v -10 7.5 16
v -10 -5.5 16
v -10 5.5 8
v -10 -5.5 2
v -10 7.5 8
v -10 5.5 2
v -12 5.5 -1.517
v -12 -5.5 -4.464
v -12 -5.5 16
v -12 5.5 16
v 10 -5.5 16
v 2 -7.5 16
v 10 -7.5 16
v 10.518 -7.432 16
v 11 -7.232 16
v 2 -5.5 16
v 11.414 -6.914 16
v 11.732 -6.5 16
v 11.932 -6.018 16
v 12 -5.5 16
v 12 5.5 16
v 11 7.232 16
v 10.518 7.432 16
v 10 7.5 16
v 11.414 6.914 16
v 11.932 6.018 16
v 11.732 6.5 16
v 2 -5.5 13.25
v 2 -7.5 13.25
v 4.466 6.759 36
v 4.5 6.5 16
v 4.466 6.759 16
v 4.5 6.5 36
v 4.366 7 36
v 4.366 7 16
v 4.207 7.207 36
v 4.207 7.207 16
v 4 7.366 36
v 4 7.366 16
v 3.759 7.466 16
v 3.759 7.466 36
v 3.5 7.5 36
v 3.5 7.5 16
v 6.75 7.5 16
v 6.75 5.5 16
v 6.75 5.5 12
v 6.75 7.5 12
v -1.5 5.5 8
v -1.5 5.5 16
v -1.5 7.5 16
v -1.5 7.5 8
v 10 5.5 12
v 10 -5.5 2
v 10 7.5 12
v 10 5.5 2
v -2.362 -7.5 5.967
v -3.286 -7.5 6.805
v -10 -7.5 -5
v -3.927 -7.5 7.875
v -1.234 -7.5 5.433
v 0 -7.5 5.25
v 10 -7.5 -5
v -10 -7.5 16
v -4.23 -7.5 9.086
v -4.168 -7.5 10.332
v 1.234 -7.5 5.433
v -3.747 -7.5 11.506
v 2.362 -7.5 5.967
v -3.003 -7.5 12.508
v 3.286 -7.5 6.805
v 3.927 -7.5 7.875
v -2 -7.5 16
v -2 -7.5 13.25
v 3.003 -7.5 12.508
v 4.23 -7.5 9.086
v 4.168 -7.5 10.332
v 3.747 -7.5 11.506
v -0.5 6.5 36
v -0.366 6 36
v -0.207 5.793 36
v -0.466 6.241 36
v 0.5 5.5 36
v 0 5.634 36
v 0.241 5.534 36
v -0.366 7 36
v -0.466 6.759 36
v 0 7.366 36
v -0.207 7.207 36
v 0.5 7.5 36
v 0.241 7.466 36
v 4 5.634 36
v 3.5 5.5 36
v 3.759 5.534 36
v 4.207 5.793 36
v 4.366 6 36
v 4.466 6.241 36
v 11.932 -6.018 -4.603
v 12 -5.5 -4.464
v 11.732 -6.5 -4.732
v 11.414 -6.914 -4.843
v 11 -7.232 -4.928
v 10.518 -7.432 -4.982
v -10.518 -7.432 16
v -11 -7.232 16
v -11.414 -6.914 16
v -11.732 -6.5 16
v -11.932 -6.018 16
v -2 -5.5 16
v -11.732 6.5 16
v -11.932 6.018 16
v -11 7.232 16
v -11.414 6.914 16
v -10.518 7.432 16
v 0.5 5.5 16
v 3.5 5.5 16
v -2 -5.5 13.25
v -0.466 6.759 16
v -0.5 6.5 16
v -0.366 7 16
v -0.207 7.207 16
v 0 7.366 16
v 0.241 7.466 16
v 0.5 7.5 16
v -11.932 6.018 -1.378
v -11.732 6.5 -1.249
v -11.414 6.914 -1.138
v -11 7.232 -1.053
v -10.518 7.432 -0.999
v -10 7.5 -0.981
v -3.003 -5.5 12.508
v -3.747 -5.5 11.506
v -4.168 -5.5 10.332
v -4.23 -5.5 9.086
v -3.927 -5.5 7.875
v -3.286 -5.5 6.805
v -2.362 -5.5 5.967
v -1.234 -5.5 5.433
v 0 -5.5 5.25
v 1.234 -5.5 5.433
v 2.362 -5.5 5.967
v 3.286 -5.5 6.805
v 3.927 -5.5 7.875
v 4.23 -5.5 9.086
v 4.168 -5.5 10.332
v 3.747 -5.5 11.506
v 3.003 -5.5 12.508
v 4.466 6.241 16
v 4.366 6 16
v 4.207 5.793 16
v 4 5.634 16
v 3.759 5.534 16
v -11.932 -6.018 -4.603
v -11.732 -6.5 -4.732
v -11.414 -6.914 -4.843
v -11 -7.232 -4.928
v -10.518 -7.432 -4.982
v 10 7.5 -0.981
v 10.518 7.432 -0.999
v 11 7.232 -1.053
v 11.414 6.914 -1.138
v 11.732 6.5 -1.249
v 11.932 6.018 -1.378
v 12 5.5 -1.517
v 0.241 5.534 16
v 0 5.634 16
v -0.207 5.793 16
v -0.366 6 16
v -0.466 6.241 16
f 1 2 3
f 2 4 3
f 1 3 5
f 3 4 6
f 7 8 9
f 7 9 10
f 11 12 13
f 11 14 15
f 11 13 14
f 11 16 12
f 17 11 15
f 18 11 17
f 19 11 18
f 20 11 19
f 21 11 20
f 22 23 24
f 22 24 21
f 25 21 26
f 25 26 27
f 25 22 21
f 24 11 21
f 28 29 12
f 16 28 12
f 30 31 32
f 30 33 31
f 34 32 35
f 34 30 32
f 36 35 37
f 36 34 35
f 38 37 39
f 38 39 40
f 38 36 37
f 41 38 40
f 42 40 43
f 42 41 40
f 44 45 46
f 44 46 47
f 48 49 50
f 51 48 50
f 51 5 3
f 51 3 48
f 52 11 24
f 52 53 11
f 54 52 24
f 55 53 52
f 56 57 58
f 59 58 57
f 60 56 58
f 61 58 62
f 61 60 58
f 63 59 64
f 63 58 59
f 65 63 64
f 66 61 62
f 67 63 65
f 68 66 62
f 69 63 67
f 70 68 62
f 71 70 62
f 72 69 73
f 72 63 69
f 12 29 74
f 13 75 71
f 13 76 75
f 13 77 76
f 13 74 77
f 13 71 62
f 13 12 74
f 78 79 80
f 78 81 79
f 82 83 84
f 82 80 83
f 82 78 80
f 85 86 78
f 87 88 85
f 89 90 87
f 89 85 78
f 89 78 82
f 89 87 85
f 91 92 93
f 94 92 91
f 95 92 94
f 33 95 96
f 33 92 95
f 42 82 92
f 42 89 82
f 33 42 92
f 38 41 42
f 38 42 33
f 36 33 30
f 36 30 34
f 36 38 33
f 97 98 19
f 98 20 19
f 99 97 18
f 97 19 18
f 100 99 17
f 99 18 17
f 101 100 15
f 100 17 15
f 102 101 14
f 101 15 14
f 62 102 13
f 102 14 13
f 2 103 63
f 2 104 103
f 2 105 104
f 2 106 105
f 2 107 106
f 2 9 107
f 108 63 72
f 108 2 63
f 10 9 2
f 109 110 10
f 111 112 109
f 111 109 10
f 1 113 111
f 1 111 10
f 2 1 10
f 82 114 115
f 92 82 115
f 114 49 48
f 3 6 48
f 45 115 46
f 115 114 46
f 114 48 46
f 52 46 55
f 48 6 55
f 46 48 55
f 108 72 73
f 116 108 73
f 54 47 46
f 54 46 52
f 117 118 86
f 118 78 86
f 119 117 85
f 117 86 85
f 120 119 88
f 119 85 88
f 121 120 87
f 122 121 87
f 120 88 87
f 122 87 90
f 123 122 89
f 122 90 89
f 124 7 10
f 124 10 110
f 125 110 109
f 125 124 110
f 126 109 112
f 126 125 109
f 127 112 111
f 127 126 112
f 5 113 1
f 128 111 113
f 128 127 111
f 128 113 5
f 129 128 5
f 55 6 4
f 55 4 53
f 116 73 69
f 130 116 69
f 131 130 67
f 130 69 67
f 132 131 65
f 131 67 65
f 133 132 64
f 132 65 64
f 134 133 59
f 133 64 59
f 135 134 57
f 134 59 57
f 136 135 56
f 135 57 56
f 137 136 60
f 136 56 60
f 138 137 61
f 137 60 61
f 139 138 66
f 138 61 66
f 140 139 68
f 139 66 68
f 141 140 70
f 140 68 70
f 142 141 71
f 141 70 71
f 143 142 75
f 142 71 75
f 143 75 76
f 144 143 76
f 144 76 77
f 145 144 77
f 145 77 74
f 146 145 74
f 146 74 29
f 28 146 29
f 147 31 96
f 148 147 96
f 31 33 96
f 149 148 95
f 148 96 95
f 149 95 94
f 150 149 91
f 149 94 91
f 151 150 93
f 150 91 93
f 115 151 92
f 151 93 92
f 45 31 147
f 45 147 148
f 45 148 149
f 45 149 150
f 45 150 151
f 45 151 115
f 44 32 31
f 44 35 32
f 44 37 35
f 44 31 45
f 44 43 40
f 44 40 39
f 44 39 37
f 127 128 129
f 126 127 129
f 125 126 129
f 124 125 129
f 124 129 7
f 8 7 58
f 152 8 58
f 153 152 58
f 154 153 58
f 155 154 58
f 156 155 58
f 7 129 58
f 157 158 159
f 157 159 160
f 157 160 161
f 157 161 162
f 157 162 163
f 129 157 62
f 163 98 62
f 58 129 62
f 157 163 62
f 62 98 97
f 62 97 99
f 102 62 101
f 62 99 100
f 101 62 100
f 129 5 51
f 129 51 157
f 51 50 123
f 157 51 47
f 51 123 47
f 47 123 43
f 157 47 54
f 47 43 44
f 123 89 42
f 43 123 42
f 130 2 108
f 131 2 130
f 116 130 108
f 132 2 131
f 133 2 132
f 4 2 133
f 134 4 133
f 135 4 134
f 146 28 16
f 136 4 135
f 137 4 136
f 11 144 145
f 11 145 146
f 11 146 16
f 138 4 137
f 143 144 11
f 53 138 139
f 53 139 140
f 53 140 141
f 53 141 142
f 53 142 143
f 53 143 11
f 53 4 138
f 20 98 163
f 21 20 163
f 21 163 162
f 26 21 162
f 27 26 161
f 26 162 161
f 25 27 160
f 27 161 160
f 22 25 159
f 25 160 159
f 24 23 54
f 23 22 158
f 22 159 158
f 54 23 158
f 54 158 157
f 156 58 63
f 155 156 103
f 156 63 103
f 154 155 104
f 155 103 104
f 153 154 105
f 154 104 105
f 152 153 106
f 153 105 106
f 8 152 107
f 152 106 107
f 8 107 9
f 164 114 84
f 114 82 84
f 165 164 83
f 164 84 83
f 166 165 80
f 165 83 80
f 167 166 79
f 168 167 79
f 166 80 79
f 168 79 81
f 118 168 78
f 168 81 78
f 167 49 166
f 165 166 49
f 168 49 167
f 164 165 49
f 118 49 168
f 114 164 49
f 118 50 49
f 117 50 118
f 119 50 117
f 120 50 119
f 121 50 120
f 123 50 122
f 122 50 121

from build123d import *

# Parameters (mm, degrees)
F0_W      = 24
F0_H      = 15
F1_DEPTH  = 16
F2_T      = -2
F4_DEPTH  = 5
F5_W      = 5
F5_H      = 2
F6_DEPTH  = 20
F7_DEPTH  = 5
F9_R      = 0.99999
F10_R     = 2
F11_W     = 8.5
F11_H     = 2
F12_DEPTH = 8
F13_W     = 3.25
F13_H     = 2
F14_DEPTH = 4
F15_DEPTH = 25


# Not quite as in the source:
# - a fillet or chamfer is up to 0.001 mm smaller than in the source, because OpenCascade refuses the exact size


with BuildPart() as f1:
    # F0 (on Top) → F1 (new body)
    with BuildSketch(Plane.XY):
        Rectangle(F0_W, F0_H)
    extrude(amount=F1_DEPTH)

    # F2
    f2_openings = [f1.faces().sort_by_distance(p)[0] for p in [
        (0, 0, 16),
    ]]
    offset(amount=F2_T, openings=f2_openings)

    # F3 (on face) → F4 (cut)
    with BuildSketch(Plane.XZ.offset(7.5)):
        with BuildLine():
            Line((-2, 16), (-2, 13.25))
            ThreePointArc((-2, 13.25), (0, 5.25), (2, 13.25))
            Line((2, 13.25), (2, 16))
            Line((2, 16), (-2, 16))
        make_face()
    extrude(amount=-F4_DEPTH, mode=Mode.SUBTRACT)

    # F5 (on face) → F6 (join)
    with BuildSketch(Plane.XY.offset(16)):
        with Locations((2, 6.5)):
            Rectangle(F5_W, F5_H)
    extrude(amount=F6_DEPTH)

    # F7 (add): a face of the model
    f7_faces = [f1.faces().sort_by_distance(p)[0] for p in [
        (0, 0, 0),
    ]]
    extrude(f7_faces, amount=F7_DEPTH)

    # F9 (radius 1 in the source; OpenCascade refuses exactly that, so slightly less here)
    f9_edges = [f1.edges().sort_by_distance(p)[0] for p in [
        (4.5, 5.5, 26),
        (4.5, 7.5, 26),
        (-0.5, 5.5, 26),
        (-0.5, 7.5, 26),
    ]]
    fillet(f9_edges, radius=F9_R)

    # F10
    f10_edges = [f1.edges().sort_by_distance(p)[0] for p in [
        (12, -7.5, 5.5),
        (-12, -7.5, 5.5),
        (-12, 7.5, 5.5),
        (12, 7.5, 5.5),
    ]]
    fillet(f10_edges, radius=F10_R)

    # F11 (on face) → F12 (cut)
    with BuildSketch(Plane.XY.offset(16)):
        with Locations((-5.75, 6.5)):
            Rectangle(F11_W, F11_H)
    extrude(amount=-F12_DEPTH, mode=Mode.SUBTRACT)

    # F13 (on face) → F14 (cut)
    with BuildSketch(Plane.XY.offset(16)):
        with Locations((8.375, 6.5)):
            Rectangle(F13_W, F13_H)
    extrude(amount=-F14_DEPTH, mode=Mode.SUBTRACT)

    # F8 (on face) → F15 (cut)
    with BuildSketch(Plane.YZ.offset(12)):
        Polygon((7.5, -0.9807621135), (-7.5, -5), (7.5, -5), align=None)
    extrude(amount=-F15_DEPTH, mode=Mode.SUBTRACT)


solid = f1.part
